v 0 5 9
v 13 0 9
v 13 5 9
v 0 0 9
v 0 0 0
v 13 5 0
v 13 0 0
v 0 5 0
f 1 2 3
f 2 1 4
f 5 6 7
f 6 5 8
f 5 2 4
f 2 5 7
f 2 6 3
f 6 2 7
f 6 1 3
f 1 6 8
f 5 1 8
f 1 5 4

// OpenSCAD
// Generated by SolidPython 1.0.1 on 2020-07-29 00:46:55


cube(size = [13, 5, 9]);
/***********************************************
*********      SolidPython code:      **********
************************************************
 
# import packages: SolidPython
from solid import *
from solid.utils import *
from itertools import chain, combinations, permutations


class Resize:

    def __init__(self, scad_file):
        self.scad_file = scad_file
        #self.scad_file = import_scad(scad_file)
        # cone/cylinder param:
        self.r1 = 0
        self.r2 = 0
        self.h = 0
        # rectangular prism param:
        self.w = 0
        self.l = 0
        # ellipse param:
        self.r = 0

    # import OpenScad code (file name corresponds to shape)


    # classify shape + parameters
    def assign(self, param1, param2, param3):
        if self.scad_file == 'cone.scad':
            self.r1 = param1
            self.r2 = param2
            self.h = param3
        elif self.scad_file == 'cylinder.scad':
            self.r1 = param1
            self.r2 = param2
            self.h = param3
        elif self.scad_file == 'rectangularPrism.scad':
            self.h = param1
            self.l = param2
            self.w = param3
        else:
            self.r = param1
            self.h = param2

    # resize parameters
    def iterate(self):
        x = range(3, 20, 2)
        i = 1
        if self.scad_file == 'cone.scad':
            tempList = list(permutations(x, 2))
            for temp in tempList:
                param1 = temp[0]
                param2 = temp[1]
                filepath = 'produced_scad_files/' + 'cone' + str(param1) + '_' + str(param2) + '_' + '.scad'
                scad_render_to_file(cylinder(h=param1, r1=param2, r2=0), filepath)

        elif self.scad_file == 'cylinder.scad':
            tempList = list(permutations(x, 3))
            for temp in tempList:
                param1 = temp[0]
                param2 = temp[1]
                filepath = 'produced_scad_files/' + 'cylinder' + str(param1) + '_' + str(param2) + '_' + '.scad'
                scad_render_to_file(cylinder(h=param1, r1=param2, r2=param2), filepath)

        elif self.scad_file == 'rectangularPrism.scad':
            tempList = list(permutations(x, 3))
            for temp in tempList:
                param1 = temp[0]
                param2 = temp[1]
                param3 = temp[2]
                filepath = 'produced_scad_files/' + 'rectangularPrism' + str(param1) + '_' + str(param2) + '_' + str(
                    param3) + '.scad'
                scad_render_to_file(cube(size=(param1, param2, param3)), filepath)

        elif self.scad_file == 'ellipse.scad':
            tempList = list(permutations(x, 4))
            for temp in tempList:
                param1 = temp[0]
                param2 = temp[1]
                param3 = temp[2]
                param4 = temp[3]
                filepath = 'produced_scad_files/' + 'ellipse' + str(param1) + '_' + str(param2) + '_' + str(param3) + '_' + str(param4) + '.scad'
                scad_render_to_file(scale([param1, param2, param3])(sphere(r=param4)), filepath)

    def render_to_scadfile(self):
        scad_render_to_file(scad, 'example.scad') 
 
************************************************/
